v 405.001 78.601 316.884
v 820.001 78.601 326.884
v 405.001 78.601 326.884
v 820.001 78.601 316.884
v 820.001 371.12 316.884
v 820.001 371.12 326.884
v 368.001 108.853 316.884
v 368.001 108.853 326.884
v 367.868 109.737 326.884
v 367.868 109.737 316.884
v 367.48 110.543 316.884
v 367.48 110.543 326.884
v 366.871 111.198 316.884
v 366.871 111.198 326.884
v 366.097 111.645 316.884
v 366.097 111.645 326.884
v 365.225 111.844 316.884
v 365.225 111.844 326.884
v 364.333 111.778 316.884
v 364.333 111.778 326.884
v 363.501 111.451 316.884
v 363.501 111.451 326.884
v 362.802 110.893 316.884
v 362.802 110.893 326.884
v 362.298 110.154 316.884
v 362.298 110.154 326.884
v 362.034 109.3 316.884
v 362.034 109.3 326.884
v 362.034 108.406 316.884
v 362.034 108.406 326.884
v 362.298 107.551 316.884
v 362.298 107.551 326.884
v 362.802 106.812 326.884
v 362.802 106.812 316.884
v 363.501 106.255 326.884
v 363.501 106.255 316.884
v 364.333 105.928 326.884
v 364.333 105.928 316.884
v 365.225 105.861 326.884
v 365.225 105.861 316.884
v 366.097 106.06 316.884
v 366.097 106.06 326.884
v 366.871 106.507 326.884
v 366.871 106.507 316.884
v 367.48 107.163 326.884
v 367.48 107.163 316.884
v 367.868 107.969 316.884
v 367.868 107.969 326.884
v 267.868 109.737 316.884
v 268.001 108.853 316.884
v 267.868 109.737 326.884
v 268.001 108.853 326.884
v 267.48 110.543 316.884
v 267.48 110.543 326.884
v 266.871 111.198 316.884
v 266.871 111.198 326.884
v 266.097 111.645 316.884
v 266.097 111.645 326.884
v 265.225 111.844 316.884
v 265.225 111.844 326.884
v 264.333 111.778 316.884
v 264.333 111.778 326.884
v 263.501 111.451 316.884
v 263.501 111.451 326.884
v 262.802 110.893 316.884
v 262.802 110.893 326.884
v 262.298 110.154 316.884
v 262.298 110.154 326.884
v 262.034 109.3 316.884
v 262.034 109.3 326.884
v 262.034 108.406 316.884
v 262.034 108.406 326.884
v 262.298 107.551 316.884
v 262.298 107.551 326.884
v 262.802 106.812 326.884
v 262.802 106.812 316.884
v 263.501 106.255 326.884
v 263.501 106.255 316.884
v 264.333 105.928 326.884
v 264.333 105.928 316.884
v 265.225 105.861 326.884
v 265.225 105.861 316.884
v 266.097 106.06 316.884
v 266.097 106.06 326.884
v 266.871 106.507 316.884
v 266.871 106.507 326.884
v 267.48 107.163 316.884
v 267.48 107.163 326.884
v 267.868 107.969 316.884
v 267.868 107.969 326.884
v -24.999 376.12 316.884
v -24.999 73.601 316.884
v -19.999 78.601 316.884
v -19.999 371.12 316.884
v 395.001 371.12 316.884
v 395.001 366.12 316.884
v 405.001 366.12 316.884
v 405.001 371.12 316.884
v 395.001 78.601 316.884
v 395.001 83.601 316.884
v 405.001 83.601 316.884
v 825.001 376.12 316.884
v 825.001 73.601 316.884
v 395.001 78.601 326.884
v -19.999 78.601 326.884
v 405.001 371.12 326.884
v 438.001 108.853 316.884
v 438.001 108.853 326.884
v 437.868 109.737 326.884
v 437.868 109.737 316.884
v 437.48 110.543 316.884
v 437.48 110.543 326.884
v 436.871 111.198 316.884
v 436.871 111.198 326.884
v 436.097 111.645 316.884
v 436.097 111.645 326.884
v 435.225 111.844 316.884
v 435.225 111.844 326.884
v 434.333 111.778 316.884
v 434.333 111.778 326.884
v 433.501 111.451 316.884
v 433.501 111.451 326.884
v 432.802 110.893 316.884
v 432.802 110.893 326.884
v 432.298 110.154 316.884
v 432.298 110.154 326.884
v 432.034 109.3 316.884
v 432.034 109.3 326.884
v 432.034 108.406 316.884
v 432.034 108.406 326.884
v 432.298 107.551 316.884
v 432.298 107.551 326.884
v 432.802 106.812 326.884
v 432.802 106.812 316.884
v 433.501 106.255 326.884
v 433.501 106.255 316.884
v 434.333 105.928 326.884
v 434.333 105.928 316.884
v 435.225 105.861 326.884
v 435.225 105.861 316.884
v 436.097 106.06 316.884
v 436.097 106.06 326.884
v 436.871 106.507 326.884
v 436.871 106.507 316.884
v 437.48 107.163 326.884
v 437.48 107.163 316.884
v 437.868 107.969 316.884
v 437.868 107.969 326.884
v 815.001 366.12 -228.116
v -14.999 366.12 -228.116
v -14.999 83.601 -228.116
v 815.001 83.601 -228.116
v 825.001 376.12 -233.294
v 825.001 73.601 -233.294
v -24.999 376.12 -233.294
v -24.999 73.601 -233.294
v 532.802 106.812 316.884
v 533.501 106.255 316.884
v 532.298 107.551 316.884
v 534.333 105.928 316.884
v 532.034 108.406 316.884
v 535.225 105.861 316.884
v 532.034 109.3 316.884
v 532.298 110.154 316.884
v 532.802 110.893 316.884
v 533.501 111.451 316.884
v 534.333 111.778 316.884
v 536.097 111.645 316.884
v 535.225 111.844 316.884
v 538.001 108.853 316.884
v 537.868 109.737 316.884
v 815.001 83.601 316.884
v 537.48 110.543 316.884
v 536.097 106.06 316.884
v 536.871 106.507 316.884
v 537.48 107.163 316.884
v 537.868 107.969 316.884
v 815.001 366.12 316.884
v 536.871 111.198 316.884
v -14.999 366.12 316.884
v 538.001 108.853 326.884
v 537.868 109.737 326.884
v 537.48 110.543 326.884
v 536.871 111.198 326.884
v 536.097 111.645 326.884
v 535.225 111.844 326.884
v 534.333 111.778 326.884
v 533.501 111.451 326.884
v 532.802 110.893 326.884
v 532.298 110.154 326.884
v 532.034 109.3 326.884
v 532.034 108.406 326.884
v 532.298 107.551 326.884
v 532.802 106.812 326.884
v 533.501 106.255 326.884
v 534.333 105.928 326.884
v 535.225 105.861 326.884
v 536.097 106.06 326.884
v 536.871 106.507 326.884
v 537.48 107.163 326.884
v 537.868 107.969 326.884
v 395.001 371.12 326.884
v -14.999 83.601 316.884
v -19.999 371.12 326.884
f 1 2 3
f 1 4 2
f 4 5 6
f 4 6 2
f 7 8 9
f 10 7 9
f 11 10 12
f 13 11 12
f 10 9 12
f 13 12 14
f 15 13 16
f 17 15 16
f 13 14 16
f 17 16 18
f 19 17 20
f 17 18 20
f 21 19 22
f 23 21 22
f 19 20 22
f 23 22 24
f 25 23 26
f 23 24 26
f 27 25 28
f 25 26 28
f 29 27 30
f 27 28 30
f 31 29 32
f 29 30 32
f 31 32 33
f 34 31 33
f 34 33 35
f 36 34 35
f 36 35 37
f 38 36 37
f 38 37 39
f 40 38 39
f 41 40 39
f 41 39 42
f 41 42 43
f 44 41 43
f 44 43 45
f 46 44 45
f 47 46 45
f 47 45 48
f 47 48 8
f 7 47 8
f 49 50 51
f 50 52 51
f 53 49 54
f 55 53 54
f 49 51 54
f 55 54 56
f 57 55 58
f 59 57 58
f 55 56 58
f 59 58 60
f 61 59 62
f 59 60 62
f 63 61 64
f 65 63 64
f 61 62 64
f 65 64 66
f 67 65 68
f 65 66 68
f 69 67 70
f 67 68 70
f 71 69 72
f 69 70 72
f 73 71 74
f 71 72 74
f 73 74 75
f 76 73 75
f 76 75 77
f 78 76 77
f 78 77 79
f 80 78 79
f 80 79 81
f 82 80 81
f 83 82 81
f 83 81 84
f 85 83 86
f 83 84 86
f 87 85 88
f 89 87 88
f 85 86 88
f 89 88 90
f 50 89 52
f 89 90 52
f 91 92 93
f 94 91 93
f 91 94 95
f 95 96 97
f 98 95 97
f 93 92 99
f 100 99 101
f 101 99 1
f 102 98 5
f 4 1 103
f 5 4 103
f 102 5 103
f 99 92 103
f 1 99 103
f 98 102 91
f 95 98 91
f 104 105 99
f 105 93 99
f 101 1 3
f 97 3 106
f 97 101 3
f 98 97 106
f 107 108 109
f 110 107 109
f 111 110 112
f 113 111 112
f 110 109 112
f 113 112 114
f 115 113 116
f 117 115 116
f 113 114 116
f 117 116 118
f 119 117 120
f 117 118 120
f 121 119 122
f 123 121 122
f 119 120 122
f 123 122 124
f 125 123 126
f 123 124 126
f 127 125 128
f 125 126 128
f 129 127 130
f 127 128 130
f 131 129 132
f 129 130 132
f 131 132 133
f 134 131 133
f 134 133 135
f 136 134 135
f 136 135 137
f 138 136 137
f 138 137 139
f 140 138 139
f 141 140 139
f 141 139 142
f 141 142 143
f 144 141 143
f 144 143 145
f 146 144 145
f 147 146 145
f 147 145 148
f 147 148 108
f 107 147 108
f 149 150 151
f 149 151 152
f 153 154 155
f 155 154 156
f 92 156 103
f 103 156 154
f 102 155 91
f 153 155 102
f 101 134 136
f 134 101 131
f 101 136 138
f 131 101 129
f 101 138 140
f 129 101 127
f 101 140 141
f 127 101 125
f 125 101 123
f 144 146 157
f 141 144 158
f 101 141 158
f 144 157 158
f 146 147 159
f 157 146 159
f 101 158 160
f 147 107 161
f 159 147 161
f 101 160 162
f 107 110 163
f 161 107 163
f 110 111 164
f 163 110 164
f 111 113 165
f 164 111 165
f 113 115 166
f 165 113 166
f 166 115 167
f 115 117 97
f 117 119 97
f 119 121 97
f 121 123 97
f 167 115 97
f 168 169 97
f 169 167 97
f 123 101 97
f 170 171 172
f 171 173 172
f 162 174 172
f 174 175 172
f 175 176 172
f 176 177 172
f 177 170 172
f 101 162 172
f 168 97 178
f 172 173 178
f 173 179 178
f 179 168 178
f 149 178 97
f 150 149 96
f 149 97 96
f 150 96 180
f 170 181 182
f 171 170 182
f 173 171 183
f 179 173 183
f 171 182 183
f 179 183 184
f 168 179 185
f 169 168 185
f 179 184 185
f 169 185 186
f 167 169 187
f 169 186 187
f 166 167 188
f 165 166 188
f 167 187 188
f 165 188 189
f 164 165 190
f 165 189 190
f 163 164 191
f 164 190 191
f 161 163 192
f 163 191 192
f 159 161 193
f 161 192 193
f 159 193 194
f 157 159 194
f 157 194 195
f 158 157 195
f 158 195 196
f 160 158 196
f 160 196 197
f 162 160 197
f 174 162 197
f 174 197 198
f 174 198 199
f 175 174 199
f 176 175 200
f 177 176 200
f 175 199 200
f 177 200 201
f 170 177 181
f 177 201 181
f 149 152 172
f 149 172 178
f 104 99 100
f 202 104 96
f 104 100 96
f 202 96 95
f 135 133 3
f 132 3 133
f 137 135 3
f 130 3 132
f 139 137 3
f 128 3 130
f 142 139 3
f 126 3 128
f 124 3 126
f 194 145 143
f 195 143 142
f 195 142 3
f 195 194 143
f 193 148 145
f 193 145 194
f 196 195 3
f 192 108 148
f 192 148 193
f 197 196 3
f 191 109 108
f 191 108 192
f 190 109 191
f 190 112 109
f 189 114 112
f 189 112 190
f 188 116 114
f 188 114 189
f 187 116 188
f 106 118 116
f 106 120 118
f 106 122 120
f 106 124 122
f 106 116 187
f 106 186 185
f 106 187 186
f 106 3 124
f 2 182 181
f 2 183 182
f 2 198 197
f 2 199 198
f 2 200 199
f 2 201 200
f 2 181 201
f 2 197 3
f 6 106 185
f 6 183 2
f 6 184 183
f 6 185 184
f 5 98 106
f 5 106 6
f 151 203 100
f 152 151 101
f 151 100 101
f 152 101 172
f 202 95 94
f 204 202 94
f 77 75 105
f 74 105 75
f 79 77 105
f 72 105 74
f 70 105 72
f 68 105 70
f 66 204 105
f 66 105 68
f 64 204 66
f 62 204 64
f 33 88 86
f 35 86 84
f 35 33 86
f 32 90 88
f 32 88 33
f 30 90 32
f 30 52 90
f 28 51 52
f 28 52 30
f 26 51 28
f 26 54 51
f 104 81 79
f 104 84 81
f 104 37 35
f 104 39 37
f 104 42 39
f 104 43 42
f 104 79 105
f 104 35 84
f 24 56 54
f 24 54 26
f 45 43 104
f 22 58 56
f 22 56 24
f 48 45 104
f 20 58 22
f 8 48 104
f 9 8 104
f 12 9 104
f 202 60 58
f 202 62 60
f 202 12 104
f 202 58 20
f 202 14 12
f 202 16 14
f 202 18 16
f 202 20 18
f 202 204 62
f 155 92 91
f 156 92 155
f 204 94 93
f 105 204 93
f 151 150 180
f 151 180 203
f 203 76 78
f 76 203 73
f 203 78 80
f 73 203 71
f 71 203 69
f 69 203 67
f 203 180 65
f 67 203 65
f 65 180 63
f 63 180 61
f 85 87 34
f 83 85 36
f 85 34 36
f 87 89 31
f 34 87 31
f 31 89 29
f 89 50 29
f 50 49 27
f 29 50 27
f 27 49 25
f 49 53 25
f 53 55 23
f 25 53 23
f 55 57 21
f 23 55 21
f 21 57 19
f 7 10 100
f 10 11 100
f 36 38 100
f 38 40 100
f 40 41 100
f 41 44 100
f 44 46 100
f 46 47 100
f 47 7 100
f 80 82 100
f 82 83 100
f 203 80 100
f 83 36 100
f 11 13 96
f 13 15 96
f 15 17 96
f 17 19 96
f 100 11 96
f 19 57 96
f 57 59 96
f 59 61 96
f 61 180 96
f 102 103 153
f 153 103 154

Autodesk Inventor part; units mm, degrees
ref_plane "YZ Plane" through (0, 0, 0) normal (1, 0, 0) x (0, 1, 0)
ref_plane "XZ Plane" through (0, 0, 0) normal (0, 1, 0) x (-1, 0, 0)
ref_plane "Plano de trabajo1" through (-24.9992, 73.6009, 295.6345) normal (0, 1, 0) x (1, 0, 0)
sketch "Boceto1" plane through (-24.9992, 73.6009, 295.6345) normal (0, 1, 0) x (1, 0, 0)
  line L0 (0, -21.25) -> (0, -5.817) projected
  line L1 (0, -21.25) -> (850, -21.25)
  line L2 (850, -21.25) -> (850, 528.929)
  line L3 (850, 528.929) -> (0, 528.929)
  line L4 (0, 528.929) -> (0, -21.25)
  point P0 (24.9992, 295.6345)
extrude "Extrusión1" add sketch "Boceto1" along normal blind 302.519
sketch "Boceto2" plane through (-24.9992, 73.6009, 316.8845) normal (0, 0, 1) x (1, 0, 0)
  line L0 (0, 0) -> (850, 0) projected
  line L1 (0, 0) -> (10, 0)
  line L2 (10, 0) -> (10, 10)
  line L3 (0, 302.519) -> (850, 302.519) projected
  line L4 (850, 302.519) -> (840, 302.519)
  line L5 (840, 302.519) -> (840, 292.519)
  line L6 (10, 10) -> (840, 10)
  line L7 (840, 10) -> (840, 292.519)
  line L8 (840, 292.519) -> (10, 292.519)
  line L9 (10, 292.519) -> (10, 10)
  point P0 (24.9992, -73.6009)
  dimension "espesor" = 10
  dimension "d3" = 10
  dimension "d4" = 10
  dimension "d5" = 10
extrude "Extrusión2" cut sketch "Boceto2" against normal blind 545
sketch "Boceto3" plane through (-24.9992, 73.6009, 316.8845) normal (0, 0, 1) x (1, 0, 0)
  line L0 (0, 0) -> (5, 0)
  line L1 (850, 0) -> (0, 0) projected
  line L2 (5, 0) -> (5, 5)
  line L3 (0, 302.519) -> (850, 302.519) projected
  line L4 (425, 302.519) -> (420, 302.519)
  line L5 (420, 302.519) -> (420, 297.519)
  line L6 (420, 297.519) -> (5, 297.519)
  line L7 (5, 297.519) -> (5, 5)
  line L8 (5, 5) -> (420, 5)
  line L9 (420, 5) -> (420, 297.519)
  line L10 (425, 302.519) -> (425, 0)
  line L11 (430, 297.519) -> (845, 297.519)
  line L12 (845, 297.519) -> (845, 5)
  line L13 (845, 5) -> (430, 5)
  line L14 (430, 5) -> (430, 297.519)
  point P0 (24.9992, -73.6009)
  dimension "d8" = 5
  dimension "d9" = 5
  dimension "d10" = 5
  dimension "d11" = 5
extrude "Extrusión3" add sketch "Boceto3" along normal blind 10 contours L7 L6 L9 L8 | L11 L12 L13 L14
sketch "Boceto4" plane through (-24.9992, 73.6009, 326.8845) normal (0, 0, 1) x (1, 0, 0)
  line L0 (5, 5) -> (420, 5) projected
  line L1 (420, 5) -> (420, 297.519) projected
  line L2 (420, 297.519) -> (5, 297.519) projected
  line L3 (5, 297.519) -> (5, 5) projected
  line L4 (845, 297.519) -> (430, 297.519) projected
  line L5 (430, 297.519) -> (430, 5) projected
  line L6 (430, 5) -> (845, 5) projected
  line L7 (845, 5) -> (845, 297.519) projected
  line L8 (10, 10) -> (10, 292.519) projected
  line L9 (10, 35.2519) -> (845, 35.2519) construction
  line L10 (340, 5) -> (340, 297.519) construction
  line L11 (430, 5) -> (845, 5) projected
  line L12 (510, 5) -> (510, 297.519) construction
  circle A0 centre (290, 35.2519) radius 3
  circle A1 centre (390, 35.2519) radius 3
  circle A2 centre (560, 35.2519) radius 3
  circle A3 centre (460, 35.2519) radius 3
  point P0 (24.9992, -73.6009)
  dimension "d15" = 30.2519
  dimension "d16" = 80
  dimension "d17" = 80
  dimension "d18" = 6
  dimension "d19" = 50
  dimension "d20" = 6
  dimension "d21" = 50
extrude "Extrusión4" cut sketch "Boceto4" against normal up to next contours A0 | A1 | A2 | A3
equation "\"d3\" = espesor"
equation "\"d4\" = espesor"
equation "\"d5\" = espesor"
equation "\"d8\" = 0.5 * espesor"
equation "\"d9\" = 0.5 * espesor"
equation "\"d10\" = 0.5 * espesor"
equation "\"d11\" = 0.5 * espesor"
equation "\"d12\" = espesor"
equation "\"d15\" = 0.1 * h_me"
equation "\"h_me\" = 302.519"
properties part number "MuebleExtractor"
